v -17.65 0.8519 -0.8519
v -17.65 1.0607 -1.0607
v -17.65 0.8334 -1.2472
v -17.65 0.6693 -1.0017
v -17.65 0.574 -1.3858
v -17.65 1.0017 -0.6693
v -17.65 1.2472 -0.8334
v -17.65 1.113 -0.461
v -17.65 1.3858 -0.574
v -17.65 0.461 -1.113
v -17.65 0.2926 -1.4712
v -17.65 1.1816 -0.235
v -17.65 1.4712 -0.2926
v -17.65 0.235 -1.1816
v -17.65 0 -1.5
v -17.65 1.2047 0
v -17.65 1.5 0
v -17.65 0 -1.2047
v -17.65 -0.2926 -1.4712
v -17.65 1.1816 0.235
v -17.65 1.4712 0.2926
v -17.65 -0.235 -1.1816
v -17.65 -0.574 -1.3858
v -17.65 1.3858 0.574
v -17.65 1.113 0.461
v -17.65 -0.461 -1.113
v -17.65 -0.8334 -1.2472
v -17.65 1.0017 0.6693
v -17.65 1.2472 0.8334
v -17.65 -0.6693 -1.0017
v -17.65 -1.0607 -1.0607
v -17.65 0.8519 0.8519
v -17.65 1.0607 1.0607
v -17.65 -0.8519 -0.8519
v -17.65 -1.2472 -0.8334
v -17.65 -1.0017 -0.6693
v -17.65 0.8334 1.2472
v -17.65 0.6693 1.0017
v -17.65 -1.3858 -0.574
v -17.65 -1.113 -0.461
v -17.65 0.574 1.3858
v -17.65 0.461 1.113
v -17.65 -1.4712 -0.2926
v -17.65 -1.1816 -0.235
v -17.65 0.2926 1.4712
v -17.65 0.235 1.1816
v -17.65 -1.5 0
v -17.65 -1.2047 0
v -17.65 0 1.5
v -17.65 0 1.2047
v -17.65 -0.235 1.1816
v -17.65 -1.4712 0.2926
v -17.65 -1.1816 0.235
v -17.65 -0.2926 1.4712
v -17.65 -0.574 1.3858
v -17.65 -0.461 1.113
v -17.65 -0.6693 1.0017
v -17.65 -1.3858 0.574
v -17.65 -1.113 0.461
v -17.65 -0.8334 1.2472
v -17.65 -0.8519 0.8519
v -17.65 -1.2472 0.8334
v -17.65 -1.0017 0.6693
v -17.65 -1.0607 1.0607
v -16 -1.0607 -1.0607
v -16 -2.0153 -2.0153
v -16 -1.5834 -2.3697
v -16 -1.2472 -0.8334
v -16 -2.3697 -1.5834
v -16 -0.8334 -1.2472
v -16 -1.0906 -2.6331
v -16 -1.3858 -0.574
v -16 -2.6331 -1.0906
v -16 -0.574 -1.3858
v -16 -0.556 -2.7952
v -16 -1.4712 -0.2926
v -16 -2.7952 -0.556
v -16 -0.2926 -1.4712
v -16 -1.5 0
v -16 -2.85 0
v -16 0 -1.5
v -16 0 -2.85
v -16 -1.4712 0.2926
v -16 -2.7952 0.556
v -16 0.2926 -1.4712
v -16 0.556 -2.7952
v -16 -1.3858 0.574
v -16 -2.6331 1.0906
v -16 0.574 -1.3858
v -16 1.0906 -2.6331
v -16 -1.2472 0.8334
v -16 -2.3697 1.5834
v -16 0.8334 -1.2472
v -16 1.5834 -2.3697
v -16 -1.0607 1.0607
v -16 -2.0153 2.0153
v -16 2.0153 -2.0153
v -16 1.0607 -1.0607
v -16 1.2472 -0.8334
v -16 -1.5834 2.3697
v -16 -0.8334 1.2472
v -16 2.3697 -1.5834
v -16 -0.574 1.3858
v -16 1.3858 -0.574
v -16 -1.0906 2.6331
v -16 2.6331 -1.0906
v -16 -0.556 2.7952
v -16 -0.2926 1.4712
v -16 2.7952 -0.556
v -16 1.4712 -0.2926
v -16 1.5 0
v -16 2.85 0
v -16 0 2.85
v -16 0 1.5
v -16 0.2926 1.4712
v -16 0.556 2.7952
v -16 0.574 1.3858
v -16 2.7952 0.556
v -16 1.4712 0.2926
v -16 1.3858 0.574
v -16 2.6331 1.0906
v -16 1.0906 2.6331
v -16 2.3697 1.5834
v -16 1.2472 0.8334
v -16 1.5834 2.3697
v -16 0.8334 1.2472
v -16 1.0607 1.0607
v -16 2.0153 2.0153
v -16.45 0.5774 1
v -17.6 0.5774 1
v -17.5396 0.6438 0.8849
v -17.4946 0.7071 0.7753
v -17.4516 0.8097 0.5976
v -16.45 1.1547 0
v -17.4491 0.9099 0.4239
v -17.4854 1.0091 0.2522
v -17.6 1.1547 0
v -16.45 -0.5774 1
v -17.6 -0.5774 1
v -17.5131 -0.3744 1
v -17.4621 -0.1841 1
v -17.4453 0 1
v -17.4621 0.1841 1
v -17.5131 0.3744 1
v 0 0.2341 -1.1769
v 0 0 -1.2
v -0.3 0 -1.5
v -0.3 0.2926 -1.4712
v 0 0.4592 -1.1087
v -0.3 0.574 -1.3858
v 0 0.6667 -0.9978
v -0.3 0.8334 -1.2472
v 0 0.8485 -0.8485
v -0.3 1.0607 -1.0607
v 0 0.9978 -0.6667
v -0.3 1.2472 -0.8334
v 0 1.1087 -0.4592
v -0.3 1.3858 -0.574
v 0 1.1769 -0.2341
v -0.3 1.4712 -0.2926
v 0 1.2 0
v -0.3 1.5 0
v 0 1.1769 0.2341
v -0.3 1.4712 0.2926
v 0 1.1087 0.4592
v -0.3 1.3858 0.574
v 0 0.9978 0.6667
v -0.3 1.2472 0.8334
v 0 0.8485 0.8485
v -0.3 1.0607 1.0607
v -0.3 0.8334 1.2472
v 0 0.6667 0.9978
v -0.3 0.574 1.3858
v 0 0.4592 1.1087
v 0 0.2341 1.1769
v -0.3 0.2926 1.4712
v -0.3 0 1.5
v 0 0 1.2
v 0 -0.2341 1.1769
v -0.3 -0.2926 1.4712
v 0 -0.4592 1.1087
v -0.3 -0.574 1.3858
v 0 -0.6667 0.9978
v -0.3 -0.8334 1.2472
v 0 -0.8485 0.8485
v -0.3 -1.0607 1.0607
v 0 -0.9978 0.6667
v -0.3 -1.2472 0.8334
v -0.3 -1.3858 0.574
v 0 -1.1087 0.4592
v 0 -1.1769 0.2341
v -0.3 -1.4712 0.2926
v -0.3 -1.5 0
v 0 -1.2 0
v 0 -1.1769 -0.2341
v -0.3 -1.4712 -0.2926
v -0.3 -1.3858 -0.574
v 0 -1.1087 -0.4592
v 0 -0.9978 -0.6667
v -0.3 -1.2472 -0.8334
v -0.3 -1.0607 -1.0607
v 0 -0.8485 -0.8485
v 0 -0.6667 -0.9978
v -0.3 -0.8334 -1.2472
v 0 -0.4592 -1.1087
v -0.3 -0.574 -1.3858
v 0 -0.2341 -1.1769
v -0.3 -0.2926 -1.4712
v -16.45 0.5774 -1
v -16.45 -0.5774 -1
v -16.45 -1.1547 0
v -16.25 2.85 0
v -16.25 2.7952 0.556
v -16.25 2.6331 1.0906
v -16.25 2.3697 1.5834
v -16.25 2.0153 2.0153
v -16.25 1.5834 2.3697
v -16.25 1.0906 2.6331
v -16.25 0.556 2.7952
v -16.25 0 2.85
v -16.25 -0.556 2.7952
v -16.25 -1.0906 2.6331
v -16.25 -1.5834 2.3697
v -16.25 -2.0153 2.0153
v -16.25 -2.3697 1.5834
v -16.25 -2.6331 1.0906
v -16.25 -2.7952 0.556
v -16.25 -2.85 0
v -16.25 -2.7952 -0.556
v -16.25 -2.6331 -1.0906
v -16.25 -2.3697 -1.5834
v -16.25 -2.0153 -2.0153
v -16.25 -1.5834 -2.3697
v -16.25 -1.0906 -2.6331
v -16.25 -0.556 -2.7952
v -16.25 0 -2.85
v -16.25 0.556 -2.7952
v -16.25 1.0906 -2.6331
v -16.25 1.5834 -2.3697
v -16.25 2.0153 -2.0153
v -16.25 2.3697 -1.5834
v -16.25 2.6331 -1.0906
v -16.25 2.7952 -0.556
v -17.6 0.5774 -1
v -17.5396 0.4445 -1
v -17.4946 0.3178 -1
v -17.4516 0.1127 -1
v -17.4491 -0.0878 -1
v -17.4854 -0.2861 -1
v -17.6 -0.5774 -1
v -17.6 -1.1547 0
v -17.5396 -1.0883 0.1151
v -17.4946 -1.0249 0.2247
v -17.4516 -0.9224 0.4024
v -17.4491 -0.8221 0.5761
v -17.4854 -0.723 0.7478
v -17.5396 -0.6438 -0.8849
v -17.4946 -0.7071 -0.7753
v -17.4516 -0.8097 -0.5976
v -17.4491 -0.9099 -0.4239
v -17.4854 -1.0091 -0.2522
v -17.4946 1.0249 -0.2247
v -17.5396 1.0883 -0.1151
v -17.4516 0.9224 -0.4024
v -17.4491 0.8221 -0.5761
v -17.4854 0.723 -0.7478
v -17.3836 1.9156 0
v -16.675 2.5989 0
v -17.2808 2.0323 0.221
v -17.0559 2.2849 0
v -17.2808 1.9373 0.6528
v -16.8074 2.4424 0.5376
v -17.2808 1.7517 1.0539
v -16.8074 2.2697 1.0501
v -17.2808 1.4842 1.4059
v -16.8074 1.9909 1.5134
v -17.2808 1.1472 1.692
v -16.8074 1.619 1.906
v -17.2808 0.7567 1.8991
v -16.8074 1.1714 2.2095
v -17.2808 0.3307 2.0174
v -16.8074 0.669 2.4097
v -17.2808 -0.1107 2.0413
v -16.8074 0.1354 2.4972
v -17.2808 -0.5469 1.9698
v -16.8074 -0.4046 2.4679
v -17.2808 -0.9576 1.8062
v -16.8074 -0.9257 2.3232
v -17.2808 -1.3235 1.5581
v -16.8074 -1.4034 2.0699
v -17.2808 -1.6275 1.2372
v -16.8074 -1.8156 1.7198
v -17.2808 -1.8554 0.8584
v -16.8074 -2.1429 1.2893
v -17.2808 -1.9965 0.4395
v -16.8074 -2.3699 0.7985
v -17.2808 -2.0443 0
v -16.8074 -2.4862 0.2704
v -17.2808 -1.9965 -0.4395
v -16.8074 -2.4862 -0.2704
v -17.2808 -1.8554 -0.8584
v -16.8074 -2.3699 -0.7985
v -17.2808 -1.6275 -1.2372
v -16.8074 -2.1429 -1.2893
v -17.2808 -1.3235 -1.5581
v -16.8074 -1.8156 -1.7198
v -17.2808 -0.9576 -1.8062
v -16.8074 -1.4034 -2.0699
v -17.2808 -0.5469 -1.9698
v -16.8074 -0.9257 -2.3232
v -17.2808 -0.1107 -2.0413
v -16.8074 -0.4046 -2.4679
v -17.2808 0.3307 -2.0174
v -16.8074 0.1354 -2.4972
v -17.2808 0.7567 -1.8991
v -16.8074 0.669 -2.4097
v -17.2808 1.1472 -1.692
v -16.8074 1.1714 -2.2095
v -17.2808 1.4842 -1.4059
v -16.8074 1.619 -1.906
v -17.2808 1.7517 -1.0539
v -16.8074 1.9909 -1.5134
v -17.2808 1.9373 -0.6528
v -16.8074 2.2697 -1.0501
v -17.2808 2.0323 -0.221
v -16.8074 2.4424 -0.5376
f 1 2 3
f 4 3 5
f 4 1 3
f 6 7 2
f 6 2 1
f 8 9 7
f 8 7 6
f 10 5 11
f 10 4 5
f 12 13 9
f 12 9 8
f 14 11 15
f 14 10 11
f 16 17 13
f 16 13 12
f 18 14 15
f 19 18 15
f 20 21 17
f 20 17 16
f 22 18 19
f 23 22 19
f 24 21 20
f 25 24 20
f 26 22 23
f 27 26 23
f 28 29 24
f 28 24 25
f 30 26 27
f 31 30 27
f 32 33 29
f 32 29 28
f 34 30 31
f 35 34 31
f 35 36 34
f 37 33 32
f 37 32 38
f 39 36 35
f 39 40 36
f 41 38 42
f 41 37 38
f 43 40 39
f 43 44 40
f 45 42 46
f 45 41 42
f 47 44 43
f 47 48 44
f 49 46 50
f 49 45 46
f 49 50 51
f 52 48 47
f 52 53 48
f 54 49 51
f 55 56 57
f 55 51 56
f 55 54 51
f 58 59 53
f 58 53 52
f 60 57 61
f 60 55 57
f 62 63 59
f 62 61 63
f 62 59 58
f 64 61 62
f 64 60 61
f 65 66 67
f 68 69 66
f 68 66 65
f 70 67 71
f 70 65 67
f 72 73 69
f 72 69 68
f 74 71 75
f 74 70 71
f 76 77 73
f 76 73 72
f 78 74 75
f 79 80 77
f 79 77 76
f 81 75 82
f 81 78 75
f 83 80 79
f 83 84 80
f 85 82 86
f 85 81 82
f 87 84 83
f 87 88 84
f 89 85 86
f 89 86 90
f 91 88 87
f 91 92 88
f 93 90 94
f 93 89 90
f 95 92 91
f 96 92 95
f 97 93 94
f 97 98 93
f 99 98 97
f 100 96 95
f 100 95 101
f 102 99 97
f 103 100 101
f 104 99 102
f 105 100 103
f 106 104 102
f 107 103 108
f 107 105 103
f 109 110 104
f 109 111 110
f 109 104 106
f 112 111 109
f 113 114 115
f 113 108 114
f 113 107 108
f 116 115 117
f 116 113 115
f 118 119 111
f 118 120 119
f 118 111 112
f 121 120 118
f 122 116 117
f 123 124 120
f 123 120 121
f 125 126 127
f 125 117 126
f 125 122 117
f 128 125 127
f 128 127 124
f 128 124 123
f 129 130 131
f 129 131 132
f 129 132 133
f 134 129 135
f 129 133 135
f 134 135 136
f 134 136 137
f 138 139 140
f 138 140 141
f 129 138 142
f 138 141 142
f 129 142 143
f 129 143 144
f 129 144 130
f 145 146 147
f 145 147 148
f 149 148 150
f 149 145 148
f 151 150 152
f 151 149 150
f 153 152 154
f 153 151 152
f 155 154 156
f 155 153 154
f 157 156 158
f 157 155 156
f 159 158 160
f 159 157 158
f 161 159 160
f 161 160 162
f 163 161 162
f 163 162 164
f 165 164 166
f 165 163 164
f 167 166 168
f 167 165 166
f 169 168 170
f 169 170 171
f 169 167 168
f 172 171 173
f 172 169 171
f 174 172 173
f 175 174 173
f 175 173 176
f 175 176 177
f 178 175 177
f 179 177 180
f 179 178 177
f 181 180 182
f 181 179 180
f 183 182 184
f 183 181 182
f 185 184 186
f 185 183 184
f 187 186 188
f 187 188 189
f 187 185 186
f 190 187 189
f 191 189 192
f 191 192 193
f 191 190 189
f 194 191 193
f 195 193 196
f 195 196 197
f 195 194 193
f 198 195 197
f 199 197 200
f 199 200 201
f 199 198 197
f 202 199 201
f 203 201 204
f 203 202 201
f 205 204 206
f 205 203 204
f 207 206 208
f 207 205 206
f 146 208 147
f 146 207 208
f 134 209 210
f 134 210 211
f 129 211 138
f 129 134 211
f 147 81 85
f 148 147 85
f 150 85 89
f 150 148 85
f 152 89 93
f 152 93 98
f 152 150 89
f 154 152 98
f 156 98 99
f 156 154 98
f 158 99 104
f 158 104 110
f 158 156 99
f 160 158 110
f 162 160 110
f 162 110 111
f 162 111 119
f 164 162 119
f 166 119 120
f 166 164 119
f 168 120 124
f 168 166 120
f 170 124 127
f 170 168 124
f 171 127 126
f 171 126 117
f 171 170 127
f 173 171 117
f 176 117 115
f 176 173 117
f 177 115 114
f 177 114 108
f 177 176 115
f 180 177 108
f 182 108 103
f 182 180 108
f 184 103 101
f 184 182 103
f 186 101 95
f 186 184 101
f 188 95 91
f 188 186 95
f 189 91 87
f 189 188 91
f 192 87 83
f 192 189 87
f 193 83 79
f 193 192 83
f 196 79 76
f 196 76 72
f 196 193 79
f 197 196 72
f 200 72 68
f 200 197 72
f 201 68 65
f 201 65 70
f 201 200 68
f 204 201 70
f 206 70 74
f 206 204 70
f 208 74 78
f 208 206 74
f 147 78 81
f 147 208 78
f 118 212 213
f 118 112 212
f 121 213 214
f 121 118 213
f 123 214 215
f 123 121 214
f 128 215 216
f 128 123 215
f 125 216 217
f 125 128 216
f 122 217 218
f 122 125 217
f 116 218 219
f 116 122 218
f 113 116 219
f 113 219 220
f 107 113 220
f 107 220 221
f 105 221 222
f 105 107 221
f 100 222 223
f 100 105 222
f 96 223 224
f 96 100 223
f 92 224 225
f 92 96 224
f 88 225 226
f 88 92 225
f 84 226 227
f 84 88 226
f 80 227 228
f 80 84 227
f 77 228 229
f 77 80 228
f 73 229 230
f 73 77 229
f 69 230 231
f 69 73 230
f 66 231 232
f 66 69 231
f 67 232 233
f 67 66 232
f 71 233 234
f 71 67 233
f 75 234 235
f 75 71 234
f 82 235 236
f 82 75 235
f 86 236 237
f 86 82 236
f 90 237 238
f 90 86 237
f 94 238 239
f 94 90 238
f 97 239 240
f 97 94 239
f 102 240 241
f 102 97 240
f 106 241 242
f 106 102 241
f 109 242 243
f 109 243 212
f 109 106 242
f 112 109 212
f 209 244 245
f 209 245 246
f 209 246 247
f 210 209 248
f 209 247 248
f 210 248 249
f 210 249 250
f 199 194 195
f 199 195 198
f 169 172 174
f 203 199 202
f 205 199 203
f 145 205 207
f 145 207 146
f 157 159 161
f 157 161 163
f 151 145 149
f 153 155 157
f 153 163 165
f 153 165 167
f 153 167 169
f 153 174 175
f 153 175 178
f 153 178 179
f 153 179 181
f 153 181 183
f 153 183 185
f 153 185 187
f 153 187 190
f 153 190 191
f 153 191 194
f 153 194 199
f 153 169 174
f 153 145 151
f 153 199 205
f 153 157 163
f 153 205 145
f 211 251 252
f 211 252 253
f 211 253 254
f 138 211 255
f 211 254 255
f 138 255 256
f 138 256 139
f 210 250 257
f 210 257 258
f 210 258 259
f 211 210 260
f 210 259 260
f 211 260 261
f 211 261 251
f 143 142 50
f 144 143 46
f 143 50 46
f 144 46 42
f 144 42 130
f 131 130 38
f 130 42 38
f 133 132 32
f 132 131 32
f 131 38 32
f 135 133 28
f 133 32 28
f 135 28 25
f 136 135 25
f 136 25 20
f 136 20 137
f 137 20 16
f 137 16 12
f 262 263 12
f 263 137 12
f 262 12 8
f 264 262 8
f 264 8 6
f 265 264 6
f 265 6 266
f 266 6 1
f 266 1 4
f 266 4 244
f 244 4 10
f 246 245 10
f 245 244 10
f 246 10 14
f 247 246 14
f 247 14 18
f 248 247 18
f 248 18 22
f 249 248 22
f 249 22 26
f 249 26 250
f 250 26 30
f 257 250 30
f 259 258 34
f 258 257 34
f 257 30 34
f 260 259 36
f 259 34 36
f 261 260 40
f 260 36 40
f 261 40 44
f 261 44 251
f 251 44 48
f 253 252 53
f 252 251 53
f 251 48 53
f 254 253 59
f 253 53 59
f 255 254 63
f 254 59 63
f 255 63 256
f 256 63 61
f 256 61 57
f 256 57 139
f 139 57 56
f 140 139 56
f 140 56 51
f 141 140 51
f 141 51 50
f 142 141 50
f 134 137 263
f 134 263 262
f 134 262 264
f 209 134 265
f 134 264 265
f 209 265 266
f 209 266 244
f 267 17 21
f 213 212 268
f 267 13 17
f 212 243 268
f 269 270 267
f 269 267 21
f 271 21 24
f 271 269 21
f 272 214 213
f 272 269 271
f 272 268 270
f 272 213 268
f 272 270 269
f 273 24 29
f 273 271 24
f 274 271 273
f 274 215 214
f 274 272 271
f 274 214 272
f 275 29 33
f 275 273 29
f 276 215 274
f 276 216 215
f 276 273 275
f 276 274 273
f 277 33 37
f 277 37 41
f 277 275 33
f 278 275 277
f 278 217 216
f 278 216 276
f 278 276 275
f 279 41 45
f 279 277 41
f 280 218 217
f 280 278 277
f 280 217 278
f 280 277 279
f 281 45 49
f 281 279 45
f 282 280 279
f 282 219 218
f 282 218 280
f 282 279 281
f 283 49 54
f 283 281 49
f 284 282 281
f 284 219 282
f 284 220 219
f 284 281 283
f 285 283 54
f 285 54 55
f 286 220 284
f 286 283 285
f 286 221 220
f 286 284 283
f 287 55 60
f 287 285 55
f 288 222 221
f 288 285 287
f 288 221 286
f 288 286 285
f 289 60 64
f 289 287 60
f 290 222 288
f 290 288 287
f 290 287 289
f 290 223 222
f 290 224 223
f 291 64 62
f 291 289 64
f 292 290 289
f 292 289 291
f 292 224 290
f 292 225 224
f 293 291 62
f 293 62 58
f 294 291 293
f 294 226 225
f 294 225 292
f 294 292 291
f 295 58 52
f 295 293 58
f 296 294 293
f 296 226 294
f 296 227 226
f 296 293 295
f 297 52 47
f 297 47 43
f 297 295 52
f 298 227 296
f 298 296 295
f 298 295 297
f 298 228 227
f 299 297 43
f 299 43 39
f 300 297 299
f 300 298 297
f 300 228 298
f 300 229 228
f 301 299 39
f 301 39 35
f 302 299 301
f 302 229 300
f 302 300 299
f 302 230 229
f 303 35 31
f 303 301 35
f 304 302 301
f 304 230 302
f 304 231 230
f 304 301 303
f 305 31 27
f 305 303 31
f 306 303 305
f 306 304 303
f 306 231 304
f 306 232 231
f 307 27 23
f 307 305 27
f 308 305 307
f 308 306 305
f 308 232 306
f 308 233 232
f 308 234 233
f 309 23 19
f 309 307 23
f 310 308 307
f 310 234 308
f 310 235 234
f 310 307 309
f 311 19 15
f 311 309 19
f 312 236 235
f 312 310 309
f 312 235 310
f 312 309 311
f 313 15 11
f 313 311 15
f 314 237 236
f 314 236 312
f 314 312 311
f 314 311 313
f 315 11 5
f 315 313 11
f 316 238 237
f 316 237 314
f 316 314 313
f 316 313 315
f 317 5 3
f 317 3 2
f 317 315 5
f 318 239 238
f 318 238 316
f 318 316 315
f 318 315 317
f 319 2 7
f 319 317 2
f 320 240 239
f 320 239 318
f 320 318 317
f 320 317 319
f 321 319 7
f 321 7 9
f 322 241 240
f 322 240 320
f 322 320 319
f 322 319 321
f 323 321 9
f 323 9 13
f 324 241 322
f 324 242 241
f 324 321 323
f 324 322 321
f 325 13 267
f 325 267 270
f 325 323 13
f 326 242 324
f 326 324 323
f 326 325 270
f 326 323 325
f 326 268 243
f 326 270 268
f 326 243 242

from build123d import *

# Parameters (mm, degrees)
SKETCH2_R           = 1.5
BOSS_EXTRUDE1_DEPTH = 16
CHAMFER1_SIZE       = 0.3
CUT_EXTRUDE1_DEPTH  = 1.2
SKETCH8_R           = 1.204700538
CUT_EXTRUDE2_DEPTH  = 1
CUT_EXTRUDE2_DRAFT  = -45


with BuildPart() as part:
    # Sketch2 → Boss-Extrude1 (new body)
    with BuildSketch(Plane(origin=(0, 0, 0), x_dir=(0, 0, -1), z_dir=(1, 0, 0))):
        Circle(SKETCH2_R)
    extrude(amount=-BOSS_EXTRUDE1_DEPTH)

    # Chamfer1
    chamfer1_edges = [part.edges().sort_by_distance(p)[0] for p in [
        (0, 0, 1.5),
    ]]
    chamfer(chamfer1_edges, length=CHAMFER1_SIZE)

    # Sketch6 → Revolve1 (revolve)
    with BuildSketch(Plane.XY):
        with BuildLine():
            Line((-17.65, 0), (-17.65, 1.5))
            ThreePointArc((-17.65, 1.5), (-17.055944823, 2.284868705), (-16.25, 2.85))
            Line((-16.25, 2.85), (-16, 2.85))
            Line((-16, 2.85), (-16, 0))
            Line((-16, 0), (-17.65, 0))
        make_face()
    revolve(axis=Axis((-16, 0, 0), (1, 0, 0)))

    # Sketch7 → Cut-Extrude1 (cut)
    with BuildSketch(Plane.ZY.offset(17.65)):
        Polygon((0, 1.154700538), (-1, 0.577350269), (-1, -0.577350269), (0, -1.154700538), (1, -0.577350269), (1, 0.577350269), align=None)
    extrude(amount=-CUT_EXTRUDE1_DEPTH, mode=Mode.SUBTRACT)


with BuildPart() as cut_extrude2_tool:
    # Sketch8 → Cut-Extrude2 (with draft: the straight prism first)
    with BuildSketch(Plane.ZY.offset(17.65)):
        Circle(SKETCH8_R)
    extrude(amount=-CUT_EXTRUDE2_DEPTH)
    # Cut-Extrude2: the draft: its side faces are tilted about the plane it starts from
    cut_extrude2_sides = [cut_extrude2_tool.faces().sort_by_distance(p)[0] for p in [
        (-17.15, 0, -1.204700538),
    ]]
    draft(cut_extrude2_sides, Plane.ZY.offset(17.65), CUT_EXTRUDE2_DRAFT)


with BuildPart() as part_1:
    add(part.part)

    # Cut-Extrude2: cut by cut_extrude2_tool
    add(cut_extrude2_tool.part, mode=Mode.SUBTRACT)


solid = part_1.part
